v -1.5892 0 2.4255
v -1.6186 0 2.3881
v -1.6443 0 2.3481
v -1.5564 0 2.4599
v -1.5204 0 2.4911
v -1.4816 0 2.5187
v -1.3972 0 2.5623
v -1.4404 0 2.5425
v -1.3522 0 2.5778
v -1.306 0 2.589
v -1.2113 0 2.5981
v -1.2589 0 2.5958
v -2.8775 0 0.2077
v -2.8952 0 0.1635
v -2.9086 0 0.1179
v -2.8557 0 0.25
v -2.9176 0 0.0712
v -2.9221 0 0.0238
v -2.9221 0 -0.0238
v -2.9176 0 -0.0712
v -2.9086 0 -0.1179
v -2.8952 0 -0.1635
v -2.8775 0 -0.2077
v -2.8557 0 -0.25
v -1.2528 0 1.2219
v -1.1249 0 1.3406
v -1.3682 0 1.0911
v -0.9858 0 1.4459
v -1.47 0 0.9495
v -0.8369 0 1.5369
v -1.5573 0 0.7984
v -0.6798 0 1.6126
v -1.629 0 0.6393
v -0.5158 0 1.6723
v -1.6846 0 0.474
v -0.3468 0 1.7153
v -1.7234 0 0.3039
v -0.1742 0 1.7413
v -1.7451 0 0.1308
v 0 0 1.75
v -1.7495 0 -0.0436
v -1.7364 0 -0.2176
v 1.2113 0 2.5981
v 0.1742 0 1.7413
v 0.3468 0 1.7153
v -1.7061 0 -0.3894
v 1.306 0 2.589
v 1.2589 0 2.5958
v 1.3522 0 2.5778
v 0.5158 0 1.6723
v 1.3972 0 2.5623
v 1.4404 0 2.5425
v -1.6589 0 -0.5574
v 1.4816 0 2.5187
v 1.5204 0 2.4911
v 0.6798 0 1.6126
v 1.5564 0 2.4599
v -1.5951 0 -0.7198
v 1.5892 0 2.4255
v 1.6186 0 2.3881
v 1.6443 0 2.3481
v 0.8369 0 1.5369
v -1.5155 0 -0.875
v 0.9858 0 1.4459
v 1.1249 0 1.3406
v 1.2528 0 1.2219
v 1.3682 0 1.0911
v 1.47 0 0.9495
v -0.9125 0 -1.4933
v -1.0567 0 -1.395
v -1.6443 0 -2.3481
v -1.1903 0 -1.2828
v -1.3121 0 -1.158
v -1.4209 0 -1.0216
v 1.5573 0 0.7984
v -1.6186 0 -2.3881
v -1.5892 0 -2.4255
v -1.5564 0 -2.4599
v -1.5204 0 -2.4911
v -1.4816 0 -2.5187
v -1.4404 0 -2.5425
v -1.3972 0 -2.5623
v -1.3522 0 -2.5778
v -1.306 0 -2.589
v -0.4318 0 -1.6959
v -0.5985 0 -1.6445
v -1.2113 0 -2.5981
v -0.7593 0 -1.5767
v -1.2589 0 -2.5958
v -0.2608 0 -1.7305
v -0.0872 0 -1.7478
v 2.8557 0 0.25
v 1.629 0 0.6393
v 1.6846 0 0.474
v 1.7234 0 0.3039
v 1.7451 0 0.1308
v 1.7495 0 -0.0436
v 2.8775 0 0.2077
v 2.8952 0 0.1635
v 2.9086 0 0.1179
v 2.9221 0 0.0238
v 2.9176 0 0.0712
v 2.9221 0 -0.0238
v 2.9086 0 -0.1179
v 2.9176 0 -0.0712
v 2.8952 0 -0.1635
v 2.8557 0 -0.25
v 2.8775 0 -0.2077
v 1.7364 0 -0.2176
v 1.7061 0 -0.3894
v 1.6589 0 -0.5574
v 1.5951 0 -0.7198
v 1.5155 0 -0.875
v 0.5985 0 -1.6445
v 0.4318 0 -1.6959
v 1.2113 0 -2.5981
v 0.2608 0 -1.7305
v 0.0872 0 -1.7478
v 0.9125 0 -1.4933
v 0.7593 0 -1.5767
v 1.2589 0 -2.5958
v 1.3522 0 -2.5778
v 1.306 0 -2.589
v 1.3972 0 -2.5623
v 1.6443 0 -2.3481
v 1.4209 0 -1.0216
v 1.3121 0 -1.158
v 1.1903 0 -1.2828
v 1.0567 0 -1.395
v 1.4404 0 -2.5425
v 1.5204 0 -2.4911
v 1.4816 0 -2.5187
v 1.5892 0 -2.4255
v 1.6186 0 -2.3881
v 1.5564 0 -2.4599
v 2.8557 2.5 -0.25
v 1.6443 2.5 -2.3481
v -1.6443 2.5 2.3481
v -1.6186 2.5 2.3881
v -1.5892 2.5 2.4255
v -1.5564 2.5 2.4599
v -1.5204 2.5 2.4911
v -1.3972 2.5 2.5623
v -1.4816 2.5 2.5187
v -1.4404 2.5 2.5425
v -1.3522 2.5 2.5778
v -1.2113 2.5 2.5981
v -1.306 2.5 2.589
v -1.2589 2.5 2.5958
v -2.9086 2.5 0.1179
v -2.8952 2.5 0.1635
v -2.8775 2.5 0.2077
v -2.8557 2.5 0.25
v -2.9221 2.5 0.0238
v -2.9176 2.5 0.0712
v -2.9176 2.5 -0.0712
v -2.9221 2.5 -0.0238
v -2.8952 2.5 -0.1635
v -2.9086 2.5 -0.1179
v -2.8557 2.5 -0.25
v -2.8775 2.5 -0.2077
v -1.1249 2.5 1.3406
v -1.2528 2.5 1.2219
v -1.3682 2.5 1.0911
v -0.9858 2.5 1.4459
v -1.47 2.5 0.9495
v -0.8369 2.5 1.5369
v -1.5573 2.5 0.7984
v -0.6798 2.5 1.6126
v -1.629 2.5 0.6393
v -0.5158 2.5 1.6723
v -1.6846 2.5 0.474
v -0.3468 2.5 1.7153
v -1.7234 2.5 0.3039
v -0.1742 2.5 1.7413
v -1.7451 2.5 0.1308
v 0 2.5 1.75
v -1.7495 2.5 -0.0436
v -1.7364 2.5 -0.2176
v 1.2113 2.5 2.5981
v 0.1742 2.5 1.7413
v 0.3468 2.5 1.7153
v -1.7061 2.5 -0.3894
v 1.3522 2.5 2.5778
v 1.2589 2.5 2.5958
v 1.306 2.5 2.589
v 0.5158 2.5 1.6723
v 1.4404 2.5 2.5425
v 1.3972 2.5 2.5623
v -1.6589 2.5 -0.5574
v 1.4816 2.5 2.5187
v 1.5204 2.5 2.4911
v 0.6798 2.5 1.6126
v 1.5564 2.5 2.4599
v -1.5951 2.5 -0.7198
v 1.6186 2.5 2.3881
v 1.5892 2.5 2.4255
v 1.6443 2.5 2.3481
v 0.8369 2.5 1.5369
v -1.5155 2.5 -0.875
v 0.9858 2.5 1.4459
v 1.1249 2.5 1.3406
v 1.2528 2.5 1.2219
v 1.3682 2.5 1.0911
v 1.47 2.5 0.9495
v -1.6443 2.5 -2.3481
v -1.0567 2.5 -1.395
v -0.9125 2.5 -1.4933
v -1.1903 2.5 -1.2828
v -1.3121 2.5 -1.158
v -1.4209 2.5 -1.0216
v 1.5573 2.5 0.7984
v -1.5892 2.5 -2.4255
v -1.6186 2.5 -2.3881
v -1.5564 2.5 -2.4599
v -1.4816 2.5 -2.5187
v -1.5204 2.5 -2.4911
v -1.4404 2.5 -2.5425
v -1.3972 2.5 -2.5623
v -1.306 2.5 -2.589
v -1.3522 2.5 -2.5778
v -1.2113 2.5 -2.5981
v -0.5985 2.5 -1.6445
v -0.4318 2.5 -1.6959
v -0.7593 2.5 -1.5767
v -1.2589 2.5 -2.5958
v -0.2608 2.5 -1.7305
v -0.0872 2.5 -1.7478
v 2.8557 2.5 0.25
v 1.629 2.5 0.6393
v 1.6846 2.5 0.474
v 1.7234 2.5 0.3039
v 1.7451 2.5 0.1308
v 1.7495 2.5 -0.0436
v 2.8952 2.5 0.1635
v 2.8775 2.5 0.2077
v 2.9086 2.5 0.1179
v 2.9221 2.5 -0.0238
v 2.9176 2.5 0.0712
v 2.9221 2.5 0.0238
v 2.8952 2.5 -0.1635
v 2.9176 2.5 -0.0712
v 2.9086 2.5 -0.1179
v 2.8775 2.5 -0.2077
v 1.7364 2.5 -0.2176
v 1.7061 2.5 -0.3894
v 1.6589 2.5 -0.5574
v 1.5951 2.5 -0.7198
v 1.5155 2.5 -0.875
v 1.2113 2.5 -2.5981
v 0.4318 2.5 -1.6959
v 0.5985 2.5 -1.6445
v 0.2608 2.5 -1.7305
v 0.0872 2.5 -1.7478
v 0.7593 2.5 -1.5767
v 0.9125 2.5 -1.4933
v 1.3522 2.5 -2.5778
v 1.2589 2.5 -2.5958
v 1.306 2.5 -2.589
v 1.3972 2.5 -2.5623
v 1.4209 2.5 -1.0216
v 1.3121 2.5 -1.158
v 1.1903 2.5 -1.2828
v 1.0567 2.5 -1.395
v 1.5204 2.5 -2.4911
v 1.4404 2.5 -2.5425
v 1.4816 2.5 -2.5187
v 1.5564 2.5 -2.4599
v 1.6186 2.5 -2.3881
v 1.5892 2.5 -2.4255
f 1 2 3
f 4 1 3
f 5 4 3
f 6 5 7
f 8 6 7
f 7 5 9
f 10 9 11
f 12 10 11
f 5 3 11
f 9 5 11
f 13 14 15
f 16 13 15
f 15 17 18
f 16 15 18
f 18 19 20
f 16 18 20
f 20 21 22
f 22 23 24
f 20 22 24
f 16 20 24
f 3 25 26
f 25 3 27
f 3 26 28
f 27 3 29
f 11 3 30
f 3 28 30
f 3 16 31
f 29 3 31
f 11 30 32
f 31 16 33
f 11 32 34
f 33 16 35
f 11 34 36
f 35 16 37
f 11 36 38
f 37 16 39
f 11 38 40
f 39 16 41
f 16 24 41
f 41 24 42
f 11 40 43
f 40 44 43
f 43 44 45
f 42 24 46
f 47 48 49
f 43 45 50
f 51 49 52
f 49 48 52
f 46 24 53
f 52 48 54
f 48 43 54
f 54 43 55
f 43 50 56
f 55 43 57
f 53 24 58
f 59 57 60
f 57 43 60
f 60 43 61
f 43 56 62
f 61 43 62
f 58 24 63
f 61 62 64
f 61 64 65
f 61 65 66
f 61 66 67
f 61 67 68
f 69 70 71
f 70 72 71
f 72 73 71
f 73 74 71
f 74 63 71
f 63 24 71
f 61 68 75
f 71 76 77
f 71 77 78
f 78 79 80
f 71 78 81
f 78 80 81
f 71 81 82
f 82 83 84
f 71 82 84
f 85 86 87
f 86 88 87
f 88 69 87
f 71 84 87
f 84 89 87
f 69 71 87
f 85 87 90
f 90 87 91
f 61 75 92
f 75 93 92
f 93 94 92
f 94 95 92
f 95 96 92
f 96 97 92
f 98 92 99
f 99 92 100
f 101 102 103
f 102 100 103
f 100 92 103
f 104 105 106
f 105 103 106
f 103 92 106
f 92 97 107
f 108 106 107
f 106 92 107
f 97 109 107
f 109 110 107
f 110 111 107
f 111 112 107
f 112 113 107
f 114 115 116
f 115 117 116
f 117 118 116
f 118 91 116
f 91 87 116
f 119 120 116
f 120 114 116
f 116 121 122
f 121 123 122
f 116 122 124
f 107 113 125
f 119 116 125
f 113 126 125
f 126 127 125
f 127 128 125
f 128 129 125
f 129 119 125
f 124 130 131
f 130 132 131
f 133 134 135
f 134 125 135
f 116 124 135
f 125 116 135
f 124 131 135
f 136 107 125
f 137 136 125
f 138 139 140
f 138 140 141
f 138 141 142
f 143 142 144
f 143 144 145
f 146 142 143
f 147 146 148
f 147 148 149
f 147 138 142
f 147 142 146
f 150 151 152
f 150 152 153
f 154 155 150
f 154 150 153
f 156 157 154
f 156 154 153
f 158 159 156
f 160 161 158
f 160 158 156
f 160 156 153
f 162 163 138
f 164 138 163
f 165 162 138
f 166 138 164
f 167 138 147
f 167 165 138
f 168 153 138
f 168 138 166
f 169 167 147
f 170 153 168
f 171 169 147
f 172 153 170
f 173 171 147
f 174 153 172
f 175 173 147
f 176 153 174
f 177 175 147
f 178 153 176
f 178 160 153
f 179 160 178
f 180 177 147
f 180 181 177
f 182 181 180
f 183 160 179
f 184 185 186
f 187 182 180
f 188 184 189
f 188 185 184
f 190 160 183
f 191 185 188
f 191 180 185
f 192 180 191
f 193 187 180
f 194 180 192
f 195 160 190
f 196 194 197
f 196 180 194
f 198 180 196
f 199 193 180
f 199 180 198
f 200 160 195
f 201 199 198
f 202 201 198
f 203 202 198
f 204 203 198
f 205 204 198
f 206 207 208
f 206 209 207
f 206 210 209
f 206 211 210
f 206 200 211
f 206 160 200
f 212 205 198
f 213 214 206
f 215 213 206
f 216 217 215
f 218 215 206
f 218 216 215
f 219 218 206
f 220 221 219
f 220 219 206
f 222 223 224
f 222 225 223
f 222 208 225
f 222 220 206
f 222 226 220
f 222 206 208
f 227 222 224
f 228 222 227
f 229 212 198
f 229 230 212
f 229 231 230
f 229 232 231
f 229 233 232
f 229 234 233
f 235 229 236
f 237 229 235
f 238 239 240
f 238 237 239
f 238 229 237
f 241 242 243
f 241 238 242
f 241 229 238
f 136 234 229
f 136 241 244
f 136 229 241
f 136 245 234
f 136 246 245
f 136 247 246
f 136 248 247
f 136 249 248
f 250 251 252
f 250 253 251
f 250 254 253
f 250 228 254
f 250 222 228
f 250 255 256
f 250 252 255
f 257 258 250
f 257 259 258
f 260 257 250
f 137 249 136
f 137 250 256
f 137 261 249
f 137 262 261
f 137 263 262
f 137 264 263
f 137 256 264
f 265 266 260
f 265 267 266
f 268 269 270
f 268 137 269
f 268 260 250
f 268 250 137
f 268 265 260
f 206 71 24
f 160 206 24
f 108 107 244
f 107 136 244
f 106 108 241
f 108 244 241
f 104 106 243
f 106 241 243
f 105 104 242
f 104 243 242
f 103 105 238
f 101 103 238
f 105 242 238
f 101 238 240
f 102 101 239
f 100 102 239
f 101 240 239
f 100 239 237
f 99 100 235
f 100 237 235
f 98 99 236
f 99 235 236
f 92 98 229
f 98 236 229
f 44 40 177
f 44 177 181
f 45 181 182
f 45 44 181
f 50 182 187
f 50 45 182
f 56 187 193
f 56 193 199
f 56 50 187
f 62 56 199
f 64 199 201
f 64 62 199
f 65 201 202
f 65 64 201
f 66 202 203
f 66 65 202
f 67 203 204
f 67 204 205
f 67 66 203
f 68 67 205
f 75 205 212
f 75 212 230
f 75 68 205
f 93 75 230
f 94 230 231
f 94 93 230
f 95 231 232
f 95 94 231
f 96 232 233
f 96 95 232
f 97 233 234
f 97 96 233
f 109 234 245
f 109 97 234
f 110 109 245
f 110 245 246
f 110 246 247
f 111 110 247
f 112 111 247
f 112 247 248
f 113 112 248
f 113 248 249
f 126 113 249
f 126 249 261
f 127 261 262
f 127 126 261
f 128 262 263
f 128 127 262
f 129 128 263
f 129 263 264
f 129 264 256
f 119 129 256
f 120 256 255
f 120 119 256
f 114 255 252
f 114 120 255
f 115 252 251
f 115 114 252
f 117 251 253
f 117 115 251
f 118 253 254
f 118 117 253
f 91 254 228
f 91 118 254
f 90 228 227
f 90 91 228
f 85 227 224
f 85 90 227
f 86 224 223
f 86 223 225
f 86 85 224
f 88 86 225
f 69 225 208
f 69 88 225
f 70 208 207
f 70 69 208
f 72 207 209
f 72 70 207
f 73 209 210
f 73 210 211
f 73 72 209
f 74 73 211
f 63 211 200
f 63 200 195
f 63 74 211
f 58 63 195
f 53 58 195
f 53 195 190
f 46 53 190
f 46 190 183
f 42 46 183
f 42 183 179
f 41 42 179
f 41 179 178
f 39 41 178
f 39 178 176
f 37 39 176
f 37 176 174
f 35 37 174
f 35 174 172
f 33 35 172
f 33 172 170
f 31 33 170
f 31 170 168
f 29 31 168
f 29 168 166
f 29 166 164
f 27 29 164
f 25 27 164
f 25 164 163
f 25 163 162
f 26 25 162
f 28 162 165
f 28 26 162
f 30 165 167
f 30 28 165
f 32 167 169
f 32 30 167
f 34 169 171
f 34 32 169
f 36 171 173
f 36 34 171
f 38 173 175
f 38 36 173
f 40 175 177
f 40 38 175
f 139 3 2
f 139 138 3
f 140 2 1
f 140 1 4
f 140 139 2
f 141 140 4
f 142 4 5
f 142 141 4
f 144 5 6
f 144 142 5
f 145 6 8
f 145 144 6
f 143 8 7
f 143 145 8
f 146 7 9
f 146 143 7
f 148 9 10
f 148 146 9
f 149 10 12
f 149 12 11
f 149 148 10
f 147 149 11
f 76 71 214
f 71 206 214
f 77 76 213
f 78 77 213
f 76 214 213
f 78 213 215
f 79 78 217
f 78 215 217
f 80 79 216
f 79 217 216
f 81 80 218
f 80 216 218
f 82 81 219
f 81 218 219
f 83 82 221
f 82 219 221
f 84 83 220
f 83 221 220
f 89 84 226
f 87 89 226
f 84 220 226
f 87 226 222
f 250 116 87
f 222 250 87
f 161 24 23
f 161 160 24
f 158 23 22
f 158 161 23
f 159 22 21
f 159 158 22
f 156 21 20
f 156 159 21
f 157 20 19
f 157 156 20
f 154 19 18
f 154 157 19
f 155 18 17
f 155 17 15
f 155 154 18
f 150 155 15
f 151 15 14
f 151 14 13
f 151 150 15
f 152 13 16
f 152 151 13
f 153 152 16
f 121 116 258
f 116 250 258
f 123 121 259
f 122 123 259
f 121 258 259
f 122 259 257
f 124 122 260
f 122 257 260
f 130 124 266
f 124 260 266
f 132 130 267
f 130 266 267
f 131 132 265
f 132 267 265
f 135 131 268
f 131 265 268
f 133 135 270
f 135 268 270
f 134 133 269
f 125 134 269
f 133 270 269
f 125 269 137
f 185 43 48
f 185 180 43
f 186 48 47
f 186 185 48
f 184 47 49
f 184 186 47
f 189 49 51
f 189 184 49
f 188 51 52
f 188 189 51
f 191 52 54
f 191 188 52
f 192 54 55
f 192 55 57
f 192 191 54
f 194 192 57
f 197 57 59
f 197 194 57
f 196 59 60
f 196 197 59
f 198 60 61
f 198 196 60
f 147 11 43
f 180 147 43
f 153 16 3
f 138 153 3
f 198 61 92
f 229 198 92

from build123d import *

# Parameters (mm, degrees)
SCHIZZO1_R                   = 1.75
ESTRUSIONE_ESTRUSIONE1_DEPTH = 2.5
RACCORDO1_R                  = 0.5


with BuildPart() as part:
    # Schizzo1 → Estrusione-Estrusione1 (new body)
    with BuildSketch(Plane(origin=(0, 0, 0), x_dir=(1, 0, 0), z_dir=(0, 1, 0))):
        Polygon((-1.5, 2.598076211), (-3, 0), (-1.5, -2.598076211), (1.5, -2.598076211), (3, 0), (1.5, 2.598076211), align=None)
        with Locations(Location((0, 0, 0), (0, 0, 270))):
            Circle(SCHIZZO1_R, mode=Mode.SUBTRACT)
    extrude(amount=ESTRUSIONE_ESTRUSIONE1_DEPTH)

    # Raccordo1
    raccordo1_edges = [part.edges().sort_by_distance(p)[0] for p in [
        (1.5, 1.25, -2.598076211),
        (3, 1.25, 0),
        (1.5, 1.25, 2.598076211),
        (-1.5, 1.25, 2.598076211),
        (-3, 1.25, 0),
        (-1.5, 1.25, -2.598076211),
    ]]
    fillet(raccordo1_edges, radius=RACCORDO1_R)


solid = part.part
